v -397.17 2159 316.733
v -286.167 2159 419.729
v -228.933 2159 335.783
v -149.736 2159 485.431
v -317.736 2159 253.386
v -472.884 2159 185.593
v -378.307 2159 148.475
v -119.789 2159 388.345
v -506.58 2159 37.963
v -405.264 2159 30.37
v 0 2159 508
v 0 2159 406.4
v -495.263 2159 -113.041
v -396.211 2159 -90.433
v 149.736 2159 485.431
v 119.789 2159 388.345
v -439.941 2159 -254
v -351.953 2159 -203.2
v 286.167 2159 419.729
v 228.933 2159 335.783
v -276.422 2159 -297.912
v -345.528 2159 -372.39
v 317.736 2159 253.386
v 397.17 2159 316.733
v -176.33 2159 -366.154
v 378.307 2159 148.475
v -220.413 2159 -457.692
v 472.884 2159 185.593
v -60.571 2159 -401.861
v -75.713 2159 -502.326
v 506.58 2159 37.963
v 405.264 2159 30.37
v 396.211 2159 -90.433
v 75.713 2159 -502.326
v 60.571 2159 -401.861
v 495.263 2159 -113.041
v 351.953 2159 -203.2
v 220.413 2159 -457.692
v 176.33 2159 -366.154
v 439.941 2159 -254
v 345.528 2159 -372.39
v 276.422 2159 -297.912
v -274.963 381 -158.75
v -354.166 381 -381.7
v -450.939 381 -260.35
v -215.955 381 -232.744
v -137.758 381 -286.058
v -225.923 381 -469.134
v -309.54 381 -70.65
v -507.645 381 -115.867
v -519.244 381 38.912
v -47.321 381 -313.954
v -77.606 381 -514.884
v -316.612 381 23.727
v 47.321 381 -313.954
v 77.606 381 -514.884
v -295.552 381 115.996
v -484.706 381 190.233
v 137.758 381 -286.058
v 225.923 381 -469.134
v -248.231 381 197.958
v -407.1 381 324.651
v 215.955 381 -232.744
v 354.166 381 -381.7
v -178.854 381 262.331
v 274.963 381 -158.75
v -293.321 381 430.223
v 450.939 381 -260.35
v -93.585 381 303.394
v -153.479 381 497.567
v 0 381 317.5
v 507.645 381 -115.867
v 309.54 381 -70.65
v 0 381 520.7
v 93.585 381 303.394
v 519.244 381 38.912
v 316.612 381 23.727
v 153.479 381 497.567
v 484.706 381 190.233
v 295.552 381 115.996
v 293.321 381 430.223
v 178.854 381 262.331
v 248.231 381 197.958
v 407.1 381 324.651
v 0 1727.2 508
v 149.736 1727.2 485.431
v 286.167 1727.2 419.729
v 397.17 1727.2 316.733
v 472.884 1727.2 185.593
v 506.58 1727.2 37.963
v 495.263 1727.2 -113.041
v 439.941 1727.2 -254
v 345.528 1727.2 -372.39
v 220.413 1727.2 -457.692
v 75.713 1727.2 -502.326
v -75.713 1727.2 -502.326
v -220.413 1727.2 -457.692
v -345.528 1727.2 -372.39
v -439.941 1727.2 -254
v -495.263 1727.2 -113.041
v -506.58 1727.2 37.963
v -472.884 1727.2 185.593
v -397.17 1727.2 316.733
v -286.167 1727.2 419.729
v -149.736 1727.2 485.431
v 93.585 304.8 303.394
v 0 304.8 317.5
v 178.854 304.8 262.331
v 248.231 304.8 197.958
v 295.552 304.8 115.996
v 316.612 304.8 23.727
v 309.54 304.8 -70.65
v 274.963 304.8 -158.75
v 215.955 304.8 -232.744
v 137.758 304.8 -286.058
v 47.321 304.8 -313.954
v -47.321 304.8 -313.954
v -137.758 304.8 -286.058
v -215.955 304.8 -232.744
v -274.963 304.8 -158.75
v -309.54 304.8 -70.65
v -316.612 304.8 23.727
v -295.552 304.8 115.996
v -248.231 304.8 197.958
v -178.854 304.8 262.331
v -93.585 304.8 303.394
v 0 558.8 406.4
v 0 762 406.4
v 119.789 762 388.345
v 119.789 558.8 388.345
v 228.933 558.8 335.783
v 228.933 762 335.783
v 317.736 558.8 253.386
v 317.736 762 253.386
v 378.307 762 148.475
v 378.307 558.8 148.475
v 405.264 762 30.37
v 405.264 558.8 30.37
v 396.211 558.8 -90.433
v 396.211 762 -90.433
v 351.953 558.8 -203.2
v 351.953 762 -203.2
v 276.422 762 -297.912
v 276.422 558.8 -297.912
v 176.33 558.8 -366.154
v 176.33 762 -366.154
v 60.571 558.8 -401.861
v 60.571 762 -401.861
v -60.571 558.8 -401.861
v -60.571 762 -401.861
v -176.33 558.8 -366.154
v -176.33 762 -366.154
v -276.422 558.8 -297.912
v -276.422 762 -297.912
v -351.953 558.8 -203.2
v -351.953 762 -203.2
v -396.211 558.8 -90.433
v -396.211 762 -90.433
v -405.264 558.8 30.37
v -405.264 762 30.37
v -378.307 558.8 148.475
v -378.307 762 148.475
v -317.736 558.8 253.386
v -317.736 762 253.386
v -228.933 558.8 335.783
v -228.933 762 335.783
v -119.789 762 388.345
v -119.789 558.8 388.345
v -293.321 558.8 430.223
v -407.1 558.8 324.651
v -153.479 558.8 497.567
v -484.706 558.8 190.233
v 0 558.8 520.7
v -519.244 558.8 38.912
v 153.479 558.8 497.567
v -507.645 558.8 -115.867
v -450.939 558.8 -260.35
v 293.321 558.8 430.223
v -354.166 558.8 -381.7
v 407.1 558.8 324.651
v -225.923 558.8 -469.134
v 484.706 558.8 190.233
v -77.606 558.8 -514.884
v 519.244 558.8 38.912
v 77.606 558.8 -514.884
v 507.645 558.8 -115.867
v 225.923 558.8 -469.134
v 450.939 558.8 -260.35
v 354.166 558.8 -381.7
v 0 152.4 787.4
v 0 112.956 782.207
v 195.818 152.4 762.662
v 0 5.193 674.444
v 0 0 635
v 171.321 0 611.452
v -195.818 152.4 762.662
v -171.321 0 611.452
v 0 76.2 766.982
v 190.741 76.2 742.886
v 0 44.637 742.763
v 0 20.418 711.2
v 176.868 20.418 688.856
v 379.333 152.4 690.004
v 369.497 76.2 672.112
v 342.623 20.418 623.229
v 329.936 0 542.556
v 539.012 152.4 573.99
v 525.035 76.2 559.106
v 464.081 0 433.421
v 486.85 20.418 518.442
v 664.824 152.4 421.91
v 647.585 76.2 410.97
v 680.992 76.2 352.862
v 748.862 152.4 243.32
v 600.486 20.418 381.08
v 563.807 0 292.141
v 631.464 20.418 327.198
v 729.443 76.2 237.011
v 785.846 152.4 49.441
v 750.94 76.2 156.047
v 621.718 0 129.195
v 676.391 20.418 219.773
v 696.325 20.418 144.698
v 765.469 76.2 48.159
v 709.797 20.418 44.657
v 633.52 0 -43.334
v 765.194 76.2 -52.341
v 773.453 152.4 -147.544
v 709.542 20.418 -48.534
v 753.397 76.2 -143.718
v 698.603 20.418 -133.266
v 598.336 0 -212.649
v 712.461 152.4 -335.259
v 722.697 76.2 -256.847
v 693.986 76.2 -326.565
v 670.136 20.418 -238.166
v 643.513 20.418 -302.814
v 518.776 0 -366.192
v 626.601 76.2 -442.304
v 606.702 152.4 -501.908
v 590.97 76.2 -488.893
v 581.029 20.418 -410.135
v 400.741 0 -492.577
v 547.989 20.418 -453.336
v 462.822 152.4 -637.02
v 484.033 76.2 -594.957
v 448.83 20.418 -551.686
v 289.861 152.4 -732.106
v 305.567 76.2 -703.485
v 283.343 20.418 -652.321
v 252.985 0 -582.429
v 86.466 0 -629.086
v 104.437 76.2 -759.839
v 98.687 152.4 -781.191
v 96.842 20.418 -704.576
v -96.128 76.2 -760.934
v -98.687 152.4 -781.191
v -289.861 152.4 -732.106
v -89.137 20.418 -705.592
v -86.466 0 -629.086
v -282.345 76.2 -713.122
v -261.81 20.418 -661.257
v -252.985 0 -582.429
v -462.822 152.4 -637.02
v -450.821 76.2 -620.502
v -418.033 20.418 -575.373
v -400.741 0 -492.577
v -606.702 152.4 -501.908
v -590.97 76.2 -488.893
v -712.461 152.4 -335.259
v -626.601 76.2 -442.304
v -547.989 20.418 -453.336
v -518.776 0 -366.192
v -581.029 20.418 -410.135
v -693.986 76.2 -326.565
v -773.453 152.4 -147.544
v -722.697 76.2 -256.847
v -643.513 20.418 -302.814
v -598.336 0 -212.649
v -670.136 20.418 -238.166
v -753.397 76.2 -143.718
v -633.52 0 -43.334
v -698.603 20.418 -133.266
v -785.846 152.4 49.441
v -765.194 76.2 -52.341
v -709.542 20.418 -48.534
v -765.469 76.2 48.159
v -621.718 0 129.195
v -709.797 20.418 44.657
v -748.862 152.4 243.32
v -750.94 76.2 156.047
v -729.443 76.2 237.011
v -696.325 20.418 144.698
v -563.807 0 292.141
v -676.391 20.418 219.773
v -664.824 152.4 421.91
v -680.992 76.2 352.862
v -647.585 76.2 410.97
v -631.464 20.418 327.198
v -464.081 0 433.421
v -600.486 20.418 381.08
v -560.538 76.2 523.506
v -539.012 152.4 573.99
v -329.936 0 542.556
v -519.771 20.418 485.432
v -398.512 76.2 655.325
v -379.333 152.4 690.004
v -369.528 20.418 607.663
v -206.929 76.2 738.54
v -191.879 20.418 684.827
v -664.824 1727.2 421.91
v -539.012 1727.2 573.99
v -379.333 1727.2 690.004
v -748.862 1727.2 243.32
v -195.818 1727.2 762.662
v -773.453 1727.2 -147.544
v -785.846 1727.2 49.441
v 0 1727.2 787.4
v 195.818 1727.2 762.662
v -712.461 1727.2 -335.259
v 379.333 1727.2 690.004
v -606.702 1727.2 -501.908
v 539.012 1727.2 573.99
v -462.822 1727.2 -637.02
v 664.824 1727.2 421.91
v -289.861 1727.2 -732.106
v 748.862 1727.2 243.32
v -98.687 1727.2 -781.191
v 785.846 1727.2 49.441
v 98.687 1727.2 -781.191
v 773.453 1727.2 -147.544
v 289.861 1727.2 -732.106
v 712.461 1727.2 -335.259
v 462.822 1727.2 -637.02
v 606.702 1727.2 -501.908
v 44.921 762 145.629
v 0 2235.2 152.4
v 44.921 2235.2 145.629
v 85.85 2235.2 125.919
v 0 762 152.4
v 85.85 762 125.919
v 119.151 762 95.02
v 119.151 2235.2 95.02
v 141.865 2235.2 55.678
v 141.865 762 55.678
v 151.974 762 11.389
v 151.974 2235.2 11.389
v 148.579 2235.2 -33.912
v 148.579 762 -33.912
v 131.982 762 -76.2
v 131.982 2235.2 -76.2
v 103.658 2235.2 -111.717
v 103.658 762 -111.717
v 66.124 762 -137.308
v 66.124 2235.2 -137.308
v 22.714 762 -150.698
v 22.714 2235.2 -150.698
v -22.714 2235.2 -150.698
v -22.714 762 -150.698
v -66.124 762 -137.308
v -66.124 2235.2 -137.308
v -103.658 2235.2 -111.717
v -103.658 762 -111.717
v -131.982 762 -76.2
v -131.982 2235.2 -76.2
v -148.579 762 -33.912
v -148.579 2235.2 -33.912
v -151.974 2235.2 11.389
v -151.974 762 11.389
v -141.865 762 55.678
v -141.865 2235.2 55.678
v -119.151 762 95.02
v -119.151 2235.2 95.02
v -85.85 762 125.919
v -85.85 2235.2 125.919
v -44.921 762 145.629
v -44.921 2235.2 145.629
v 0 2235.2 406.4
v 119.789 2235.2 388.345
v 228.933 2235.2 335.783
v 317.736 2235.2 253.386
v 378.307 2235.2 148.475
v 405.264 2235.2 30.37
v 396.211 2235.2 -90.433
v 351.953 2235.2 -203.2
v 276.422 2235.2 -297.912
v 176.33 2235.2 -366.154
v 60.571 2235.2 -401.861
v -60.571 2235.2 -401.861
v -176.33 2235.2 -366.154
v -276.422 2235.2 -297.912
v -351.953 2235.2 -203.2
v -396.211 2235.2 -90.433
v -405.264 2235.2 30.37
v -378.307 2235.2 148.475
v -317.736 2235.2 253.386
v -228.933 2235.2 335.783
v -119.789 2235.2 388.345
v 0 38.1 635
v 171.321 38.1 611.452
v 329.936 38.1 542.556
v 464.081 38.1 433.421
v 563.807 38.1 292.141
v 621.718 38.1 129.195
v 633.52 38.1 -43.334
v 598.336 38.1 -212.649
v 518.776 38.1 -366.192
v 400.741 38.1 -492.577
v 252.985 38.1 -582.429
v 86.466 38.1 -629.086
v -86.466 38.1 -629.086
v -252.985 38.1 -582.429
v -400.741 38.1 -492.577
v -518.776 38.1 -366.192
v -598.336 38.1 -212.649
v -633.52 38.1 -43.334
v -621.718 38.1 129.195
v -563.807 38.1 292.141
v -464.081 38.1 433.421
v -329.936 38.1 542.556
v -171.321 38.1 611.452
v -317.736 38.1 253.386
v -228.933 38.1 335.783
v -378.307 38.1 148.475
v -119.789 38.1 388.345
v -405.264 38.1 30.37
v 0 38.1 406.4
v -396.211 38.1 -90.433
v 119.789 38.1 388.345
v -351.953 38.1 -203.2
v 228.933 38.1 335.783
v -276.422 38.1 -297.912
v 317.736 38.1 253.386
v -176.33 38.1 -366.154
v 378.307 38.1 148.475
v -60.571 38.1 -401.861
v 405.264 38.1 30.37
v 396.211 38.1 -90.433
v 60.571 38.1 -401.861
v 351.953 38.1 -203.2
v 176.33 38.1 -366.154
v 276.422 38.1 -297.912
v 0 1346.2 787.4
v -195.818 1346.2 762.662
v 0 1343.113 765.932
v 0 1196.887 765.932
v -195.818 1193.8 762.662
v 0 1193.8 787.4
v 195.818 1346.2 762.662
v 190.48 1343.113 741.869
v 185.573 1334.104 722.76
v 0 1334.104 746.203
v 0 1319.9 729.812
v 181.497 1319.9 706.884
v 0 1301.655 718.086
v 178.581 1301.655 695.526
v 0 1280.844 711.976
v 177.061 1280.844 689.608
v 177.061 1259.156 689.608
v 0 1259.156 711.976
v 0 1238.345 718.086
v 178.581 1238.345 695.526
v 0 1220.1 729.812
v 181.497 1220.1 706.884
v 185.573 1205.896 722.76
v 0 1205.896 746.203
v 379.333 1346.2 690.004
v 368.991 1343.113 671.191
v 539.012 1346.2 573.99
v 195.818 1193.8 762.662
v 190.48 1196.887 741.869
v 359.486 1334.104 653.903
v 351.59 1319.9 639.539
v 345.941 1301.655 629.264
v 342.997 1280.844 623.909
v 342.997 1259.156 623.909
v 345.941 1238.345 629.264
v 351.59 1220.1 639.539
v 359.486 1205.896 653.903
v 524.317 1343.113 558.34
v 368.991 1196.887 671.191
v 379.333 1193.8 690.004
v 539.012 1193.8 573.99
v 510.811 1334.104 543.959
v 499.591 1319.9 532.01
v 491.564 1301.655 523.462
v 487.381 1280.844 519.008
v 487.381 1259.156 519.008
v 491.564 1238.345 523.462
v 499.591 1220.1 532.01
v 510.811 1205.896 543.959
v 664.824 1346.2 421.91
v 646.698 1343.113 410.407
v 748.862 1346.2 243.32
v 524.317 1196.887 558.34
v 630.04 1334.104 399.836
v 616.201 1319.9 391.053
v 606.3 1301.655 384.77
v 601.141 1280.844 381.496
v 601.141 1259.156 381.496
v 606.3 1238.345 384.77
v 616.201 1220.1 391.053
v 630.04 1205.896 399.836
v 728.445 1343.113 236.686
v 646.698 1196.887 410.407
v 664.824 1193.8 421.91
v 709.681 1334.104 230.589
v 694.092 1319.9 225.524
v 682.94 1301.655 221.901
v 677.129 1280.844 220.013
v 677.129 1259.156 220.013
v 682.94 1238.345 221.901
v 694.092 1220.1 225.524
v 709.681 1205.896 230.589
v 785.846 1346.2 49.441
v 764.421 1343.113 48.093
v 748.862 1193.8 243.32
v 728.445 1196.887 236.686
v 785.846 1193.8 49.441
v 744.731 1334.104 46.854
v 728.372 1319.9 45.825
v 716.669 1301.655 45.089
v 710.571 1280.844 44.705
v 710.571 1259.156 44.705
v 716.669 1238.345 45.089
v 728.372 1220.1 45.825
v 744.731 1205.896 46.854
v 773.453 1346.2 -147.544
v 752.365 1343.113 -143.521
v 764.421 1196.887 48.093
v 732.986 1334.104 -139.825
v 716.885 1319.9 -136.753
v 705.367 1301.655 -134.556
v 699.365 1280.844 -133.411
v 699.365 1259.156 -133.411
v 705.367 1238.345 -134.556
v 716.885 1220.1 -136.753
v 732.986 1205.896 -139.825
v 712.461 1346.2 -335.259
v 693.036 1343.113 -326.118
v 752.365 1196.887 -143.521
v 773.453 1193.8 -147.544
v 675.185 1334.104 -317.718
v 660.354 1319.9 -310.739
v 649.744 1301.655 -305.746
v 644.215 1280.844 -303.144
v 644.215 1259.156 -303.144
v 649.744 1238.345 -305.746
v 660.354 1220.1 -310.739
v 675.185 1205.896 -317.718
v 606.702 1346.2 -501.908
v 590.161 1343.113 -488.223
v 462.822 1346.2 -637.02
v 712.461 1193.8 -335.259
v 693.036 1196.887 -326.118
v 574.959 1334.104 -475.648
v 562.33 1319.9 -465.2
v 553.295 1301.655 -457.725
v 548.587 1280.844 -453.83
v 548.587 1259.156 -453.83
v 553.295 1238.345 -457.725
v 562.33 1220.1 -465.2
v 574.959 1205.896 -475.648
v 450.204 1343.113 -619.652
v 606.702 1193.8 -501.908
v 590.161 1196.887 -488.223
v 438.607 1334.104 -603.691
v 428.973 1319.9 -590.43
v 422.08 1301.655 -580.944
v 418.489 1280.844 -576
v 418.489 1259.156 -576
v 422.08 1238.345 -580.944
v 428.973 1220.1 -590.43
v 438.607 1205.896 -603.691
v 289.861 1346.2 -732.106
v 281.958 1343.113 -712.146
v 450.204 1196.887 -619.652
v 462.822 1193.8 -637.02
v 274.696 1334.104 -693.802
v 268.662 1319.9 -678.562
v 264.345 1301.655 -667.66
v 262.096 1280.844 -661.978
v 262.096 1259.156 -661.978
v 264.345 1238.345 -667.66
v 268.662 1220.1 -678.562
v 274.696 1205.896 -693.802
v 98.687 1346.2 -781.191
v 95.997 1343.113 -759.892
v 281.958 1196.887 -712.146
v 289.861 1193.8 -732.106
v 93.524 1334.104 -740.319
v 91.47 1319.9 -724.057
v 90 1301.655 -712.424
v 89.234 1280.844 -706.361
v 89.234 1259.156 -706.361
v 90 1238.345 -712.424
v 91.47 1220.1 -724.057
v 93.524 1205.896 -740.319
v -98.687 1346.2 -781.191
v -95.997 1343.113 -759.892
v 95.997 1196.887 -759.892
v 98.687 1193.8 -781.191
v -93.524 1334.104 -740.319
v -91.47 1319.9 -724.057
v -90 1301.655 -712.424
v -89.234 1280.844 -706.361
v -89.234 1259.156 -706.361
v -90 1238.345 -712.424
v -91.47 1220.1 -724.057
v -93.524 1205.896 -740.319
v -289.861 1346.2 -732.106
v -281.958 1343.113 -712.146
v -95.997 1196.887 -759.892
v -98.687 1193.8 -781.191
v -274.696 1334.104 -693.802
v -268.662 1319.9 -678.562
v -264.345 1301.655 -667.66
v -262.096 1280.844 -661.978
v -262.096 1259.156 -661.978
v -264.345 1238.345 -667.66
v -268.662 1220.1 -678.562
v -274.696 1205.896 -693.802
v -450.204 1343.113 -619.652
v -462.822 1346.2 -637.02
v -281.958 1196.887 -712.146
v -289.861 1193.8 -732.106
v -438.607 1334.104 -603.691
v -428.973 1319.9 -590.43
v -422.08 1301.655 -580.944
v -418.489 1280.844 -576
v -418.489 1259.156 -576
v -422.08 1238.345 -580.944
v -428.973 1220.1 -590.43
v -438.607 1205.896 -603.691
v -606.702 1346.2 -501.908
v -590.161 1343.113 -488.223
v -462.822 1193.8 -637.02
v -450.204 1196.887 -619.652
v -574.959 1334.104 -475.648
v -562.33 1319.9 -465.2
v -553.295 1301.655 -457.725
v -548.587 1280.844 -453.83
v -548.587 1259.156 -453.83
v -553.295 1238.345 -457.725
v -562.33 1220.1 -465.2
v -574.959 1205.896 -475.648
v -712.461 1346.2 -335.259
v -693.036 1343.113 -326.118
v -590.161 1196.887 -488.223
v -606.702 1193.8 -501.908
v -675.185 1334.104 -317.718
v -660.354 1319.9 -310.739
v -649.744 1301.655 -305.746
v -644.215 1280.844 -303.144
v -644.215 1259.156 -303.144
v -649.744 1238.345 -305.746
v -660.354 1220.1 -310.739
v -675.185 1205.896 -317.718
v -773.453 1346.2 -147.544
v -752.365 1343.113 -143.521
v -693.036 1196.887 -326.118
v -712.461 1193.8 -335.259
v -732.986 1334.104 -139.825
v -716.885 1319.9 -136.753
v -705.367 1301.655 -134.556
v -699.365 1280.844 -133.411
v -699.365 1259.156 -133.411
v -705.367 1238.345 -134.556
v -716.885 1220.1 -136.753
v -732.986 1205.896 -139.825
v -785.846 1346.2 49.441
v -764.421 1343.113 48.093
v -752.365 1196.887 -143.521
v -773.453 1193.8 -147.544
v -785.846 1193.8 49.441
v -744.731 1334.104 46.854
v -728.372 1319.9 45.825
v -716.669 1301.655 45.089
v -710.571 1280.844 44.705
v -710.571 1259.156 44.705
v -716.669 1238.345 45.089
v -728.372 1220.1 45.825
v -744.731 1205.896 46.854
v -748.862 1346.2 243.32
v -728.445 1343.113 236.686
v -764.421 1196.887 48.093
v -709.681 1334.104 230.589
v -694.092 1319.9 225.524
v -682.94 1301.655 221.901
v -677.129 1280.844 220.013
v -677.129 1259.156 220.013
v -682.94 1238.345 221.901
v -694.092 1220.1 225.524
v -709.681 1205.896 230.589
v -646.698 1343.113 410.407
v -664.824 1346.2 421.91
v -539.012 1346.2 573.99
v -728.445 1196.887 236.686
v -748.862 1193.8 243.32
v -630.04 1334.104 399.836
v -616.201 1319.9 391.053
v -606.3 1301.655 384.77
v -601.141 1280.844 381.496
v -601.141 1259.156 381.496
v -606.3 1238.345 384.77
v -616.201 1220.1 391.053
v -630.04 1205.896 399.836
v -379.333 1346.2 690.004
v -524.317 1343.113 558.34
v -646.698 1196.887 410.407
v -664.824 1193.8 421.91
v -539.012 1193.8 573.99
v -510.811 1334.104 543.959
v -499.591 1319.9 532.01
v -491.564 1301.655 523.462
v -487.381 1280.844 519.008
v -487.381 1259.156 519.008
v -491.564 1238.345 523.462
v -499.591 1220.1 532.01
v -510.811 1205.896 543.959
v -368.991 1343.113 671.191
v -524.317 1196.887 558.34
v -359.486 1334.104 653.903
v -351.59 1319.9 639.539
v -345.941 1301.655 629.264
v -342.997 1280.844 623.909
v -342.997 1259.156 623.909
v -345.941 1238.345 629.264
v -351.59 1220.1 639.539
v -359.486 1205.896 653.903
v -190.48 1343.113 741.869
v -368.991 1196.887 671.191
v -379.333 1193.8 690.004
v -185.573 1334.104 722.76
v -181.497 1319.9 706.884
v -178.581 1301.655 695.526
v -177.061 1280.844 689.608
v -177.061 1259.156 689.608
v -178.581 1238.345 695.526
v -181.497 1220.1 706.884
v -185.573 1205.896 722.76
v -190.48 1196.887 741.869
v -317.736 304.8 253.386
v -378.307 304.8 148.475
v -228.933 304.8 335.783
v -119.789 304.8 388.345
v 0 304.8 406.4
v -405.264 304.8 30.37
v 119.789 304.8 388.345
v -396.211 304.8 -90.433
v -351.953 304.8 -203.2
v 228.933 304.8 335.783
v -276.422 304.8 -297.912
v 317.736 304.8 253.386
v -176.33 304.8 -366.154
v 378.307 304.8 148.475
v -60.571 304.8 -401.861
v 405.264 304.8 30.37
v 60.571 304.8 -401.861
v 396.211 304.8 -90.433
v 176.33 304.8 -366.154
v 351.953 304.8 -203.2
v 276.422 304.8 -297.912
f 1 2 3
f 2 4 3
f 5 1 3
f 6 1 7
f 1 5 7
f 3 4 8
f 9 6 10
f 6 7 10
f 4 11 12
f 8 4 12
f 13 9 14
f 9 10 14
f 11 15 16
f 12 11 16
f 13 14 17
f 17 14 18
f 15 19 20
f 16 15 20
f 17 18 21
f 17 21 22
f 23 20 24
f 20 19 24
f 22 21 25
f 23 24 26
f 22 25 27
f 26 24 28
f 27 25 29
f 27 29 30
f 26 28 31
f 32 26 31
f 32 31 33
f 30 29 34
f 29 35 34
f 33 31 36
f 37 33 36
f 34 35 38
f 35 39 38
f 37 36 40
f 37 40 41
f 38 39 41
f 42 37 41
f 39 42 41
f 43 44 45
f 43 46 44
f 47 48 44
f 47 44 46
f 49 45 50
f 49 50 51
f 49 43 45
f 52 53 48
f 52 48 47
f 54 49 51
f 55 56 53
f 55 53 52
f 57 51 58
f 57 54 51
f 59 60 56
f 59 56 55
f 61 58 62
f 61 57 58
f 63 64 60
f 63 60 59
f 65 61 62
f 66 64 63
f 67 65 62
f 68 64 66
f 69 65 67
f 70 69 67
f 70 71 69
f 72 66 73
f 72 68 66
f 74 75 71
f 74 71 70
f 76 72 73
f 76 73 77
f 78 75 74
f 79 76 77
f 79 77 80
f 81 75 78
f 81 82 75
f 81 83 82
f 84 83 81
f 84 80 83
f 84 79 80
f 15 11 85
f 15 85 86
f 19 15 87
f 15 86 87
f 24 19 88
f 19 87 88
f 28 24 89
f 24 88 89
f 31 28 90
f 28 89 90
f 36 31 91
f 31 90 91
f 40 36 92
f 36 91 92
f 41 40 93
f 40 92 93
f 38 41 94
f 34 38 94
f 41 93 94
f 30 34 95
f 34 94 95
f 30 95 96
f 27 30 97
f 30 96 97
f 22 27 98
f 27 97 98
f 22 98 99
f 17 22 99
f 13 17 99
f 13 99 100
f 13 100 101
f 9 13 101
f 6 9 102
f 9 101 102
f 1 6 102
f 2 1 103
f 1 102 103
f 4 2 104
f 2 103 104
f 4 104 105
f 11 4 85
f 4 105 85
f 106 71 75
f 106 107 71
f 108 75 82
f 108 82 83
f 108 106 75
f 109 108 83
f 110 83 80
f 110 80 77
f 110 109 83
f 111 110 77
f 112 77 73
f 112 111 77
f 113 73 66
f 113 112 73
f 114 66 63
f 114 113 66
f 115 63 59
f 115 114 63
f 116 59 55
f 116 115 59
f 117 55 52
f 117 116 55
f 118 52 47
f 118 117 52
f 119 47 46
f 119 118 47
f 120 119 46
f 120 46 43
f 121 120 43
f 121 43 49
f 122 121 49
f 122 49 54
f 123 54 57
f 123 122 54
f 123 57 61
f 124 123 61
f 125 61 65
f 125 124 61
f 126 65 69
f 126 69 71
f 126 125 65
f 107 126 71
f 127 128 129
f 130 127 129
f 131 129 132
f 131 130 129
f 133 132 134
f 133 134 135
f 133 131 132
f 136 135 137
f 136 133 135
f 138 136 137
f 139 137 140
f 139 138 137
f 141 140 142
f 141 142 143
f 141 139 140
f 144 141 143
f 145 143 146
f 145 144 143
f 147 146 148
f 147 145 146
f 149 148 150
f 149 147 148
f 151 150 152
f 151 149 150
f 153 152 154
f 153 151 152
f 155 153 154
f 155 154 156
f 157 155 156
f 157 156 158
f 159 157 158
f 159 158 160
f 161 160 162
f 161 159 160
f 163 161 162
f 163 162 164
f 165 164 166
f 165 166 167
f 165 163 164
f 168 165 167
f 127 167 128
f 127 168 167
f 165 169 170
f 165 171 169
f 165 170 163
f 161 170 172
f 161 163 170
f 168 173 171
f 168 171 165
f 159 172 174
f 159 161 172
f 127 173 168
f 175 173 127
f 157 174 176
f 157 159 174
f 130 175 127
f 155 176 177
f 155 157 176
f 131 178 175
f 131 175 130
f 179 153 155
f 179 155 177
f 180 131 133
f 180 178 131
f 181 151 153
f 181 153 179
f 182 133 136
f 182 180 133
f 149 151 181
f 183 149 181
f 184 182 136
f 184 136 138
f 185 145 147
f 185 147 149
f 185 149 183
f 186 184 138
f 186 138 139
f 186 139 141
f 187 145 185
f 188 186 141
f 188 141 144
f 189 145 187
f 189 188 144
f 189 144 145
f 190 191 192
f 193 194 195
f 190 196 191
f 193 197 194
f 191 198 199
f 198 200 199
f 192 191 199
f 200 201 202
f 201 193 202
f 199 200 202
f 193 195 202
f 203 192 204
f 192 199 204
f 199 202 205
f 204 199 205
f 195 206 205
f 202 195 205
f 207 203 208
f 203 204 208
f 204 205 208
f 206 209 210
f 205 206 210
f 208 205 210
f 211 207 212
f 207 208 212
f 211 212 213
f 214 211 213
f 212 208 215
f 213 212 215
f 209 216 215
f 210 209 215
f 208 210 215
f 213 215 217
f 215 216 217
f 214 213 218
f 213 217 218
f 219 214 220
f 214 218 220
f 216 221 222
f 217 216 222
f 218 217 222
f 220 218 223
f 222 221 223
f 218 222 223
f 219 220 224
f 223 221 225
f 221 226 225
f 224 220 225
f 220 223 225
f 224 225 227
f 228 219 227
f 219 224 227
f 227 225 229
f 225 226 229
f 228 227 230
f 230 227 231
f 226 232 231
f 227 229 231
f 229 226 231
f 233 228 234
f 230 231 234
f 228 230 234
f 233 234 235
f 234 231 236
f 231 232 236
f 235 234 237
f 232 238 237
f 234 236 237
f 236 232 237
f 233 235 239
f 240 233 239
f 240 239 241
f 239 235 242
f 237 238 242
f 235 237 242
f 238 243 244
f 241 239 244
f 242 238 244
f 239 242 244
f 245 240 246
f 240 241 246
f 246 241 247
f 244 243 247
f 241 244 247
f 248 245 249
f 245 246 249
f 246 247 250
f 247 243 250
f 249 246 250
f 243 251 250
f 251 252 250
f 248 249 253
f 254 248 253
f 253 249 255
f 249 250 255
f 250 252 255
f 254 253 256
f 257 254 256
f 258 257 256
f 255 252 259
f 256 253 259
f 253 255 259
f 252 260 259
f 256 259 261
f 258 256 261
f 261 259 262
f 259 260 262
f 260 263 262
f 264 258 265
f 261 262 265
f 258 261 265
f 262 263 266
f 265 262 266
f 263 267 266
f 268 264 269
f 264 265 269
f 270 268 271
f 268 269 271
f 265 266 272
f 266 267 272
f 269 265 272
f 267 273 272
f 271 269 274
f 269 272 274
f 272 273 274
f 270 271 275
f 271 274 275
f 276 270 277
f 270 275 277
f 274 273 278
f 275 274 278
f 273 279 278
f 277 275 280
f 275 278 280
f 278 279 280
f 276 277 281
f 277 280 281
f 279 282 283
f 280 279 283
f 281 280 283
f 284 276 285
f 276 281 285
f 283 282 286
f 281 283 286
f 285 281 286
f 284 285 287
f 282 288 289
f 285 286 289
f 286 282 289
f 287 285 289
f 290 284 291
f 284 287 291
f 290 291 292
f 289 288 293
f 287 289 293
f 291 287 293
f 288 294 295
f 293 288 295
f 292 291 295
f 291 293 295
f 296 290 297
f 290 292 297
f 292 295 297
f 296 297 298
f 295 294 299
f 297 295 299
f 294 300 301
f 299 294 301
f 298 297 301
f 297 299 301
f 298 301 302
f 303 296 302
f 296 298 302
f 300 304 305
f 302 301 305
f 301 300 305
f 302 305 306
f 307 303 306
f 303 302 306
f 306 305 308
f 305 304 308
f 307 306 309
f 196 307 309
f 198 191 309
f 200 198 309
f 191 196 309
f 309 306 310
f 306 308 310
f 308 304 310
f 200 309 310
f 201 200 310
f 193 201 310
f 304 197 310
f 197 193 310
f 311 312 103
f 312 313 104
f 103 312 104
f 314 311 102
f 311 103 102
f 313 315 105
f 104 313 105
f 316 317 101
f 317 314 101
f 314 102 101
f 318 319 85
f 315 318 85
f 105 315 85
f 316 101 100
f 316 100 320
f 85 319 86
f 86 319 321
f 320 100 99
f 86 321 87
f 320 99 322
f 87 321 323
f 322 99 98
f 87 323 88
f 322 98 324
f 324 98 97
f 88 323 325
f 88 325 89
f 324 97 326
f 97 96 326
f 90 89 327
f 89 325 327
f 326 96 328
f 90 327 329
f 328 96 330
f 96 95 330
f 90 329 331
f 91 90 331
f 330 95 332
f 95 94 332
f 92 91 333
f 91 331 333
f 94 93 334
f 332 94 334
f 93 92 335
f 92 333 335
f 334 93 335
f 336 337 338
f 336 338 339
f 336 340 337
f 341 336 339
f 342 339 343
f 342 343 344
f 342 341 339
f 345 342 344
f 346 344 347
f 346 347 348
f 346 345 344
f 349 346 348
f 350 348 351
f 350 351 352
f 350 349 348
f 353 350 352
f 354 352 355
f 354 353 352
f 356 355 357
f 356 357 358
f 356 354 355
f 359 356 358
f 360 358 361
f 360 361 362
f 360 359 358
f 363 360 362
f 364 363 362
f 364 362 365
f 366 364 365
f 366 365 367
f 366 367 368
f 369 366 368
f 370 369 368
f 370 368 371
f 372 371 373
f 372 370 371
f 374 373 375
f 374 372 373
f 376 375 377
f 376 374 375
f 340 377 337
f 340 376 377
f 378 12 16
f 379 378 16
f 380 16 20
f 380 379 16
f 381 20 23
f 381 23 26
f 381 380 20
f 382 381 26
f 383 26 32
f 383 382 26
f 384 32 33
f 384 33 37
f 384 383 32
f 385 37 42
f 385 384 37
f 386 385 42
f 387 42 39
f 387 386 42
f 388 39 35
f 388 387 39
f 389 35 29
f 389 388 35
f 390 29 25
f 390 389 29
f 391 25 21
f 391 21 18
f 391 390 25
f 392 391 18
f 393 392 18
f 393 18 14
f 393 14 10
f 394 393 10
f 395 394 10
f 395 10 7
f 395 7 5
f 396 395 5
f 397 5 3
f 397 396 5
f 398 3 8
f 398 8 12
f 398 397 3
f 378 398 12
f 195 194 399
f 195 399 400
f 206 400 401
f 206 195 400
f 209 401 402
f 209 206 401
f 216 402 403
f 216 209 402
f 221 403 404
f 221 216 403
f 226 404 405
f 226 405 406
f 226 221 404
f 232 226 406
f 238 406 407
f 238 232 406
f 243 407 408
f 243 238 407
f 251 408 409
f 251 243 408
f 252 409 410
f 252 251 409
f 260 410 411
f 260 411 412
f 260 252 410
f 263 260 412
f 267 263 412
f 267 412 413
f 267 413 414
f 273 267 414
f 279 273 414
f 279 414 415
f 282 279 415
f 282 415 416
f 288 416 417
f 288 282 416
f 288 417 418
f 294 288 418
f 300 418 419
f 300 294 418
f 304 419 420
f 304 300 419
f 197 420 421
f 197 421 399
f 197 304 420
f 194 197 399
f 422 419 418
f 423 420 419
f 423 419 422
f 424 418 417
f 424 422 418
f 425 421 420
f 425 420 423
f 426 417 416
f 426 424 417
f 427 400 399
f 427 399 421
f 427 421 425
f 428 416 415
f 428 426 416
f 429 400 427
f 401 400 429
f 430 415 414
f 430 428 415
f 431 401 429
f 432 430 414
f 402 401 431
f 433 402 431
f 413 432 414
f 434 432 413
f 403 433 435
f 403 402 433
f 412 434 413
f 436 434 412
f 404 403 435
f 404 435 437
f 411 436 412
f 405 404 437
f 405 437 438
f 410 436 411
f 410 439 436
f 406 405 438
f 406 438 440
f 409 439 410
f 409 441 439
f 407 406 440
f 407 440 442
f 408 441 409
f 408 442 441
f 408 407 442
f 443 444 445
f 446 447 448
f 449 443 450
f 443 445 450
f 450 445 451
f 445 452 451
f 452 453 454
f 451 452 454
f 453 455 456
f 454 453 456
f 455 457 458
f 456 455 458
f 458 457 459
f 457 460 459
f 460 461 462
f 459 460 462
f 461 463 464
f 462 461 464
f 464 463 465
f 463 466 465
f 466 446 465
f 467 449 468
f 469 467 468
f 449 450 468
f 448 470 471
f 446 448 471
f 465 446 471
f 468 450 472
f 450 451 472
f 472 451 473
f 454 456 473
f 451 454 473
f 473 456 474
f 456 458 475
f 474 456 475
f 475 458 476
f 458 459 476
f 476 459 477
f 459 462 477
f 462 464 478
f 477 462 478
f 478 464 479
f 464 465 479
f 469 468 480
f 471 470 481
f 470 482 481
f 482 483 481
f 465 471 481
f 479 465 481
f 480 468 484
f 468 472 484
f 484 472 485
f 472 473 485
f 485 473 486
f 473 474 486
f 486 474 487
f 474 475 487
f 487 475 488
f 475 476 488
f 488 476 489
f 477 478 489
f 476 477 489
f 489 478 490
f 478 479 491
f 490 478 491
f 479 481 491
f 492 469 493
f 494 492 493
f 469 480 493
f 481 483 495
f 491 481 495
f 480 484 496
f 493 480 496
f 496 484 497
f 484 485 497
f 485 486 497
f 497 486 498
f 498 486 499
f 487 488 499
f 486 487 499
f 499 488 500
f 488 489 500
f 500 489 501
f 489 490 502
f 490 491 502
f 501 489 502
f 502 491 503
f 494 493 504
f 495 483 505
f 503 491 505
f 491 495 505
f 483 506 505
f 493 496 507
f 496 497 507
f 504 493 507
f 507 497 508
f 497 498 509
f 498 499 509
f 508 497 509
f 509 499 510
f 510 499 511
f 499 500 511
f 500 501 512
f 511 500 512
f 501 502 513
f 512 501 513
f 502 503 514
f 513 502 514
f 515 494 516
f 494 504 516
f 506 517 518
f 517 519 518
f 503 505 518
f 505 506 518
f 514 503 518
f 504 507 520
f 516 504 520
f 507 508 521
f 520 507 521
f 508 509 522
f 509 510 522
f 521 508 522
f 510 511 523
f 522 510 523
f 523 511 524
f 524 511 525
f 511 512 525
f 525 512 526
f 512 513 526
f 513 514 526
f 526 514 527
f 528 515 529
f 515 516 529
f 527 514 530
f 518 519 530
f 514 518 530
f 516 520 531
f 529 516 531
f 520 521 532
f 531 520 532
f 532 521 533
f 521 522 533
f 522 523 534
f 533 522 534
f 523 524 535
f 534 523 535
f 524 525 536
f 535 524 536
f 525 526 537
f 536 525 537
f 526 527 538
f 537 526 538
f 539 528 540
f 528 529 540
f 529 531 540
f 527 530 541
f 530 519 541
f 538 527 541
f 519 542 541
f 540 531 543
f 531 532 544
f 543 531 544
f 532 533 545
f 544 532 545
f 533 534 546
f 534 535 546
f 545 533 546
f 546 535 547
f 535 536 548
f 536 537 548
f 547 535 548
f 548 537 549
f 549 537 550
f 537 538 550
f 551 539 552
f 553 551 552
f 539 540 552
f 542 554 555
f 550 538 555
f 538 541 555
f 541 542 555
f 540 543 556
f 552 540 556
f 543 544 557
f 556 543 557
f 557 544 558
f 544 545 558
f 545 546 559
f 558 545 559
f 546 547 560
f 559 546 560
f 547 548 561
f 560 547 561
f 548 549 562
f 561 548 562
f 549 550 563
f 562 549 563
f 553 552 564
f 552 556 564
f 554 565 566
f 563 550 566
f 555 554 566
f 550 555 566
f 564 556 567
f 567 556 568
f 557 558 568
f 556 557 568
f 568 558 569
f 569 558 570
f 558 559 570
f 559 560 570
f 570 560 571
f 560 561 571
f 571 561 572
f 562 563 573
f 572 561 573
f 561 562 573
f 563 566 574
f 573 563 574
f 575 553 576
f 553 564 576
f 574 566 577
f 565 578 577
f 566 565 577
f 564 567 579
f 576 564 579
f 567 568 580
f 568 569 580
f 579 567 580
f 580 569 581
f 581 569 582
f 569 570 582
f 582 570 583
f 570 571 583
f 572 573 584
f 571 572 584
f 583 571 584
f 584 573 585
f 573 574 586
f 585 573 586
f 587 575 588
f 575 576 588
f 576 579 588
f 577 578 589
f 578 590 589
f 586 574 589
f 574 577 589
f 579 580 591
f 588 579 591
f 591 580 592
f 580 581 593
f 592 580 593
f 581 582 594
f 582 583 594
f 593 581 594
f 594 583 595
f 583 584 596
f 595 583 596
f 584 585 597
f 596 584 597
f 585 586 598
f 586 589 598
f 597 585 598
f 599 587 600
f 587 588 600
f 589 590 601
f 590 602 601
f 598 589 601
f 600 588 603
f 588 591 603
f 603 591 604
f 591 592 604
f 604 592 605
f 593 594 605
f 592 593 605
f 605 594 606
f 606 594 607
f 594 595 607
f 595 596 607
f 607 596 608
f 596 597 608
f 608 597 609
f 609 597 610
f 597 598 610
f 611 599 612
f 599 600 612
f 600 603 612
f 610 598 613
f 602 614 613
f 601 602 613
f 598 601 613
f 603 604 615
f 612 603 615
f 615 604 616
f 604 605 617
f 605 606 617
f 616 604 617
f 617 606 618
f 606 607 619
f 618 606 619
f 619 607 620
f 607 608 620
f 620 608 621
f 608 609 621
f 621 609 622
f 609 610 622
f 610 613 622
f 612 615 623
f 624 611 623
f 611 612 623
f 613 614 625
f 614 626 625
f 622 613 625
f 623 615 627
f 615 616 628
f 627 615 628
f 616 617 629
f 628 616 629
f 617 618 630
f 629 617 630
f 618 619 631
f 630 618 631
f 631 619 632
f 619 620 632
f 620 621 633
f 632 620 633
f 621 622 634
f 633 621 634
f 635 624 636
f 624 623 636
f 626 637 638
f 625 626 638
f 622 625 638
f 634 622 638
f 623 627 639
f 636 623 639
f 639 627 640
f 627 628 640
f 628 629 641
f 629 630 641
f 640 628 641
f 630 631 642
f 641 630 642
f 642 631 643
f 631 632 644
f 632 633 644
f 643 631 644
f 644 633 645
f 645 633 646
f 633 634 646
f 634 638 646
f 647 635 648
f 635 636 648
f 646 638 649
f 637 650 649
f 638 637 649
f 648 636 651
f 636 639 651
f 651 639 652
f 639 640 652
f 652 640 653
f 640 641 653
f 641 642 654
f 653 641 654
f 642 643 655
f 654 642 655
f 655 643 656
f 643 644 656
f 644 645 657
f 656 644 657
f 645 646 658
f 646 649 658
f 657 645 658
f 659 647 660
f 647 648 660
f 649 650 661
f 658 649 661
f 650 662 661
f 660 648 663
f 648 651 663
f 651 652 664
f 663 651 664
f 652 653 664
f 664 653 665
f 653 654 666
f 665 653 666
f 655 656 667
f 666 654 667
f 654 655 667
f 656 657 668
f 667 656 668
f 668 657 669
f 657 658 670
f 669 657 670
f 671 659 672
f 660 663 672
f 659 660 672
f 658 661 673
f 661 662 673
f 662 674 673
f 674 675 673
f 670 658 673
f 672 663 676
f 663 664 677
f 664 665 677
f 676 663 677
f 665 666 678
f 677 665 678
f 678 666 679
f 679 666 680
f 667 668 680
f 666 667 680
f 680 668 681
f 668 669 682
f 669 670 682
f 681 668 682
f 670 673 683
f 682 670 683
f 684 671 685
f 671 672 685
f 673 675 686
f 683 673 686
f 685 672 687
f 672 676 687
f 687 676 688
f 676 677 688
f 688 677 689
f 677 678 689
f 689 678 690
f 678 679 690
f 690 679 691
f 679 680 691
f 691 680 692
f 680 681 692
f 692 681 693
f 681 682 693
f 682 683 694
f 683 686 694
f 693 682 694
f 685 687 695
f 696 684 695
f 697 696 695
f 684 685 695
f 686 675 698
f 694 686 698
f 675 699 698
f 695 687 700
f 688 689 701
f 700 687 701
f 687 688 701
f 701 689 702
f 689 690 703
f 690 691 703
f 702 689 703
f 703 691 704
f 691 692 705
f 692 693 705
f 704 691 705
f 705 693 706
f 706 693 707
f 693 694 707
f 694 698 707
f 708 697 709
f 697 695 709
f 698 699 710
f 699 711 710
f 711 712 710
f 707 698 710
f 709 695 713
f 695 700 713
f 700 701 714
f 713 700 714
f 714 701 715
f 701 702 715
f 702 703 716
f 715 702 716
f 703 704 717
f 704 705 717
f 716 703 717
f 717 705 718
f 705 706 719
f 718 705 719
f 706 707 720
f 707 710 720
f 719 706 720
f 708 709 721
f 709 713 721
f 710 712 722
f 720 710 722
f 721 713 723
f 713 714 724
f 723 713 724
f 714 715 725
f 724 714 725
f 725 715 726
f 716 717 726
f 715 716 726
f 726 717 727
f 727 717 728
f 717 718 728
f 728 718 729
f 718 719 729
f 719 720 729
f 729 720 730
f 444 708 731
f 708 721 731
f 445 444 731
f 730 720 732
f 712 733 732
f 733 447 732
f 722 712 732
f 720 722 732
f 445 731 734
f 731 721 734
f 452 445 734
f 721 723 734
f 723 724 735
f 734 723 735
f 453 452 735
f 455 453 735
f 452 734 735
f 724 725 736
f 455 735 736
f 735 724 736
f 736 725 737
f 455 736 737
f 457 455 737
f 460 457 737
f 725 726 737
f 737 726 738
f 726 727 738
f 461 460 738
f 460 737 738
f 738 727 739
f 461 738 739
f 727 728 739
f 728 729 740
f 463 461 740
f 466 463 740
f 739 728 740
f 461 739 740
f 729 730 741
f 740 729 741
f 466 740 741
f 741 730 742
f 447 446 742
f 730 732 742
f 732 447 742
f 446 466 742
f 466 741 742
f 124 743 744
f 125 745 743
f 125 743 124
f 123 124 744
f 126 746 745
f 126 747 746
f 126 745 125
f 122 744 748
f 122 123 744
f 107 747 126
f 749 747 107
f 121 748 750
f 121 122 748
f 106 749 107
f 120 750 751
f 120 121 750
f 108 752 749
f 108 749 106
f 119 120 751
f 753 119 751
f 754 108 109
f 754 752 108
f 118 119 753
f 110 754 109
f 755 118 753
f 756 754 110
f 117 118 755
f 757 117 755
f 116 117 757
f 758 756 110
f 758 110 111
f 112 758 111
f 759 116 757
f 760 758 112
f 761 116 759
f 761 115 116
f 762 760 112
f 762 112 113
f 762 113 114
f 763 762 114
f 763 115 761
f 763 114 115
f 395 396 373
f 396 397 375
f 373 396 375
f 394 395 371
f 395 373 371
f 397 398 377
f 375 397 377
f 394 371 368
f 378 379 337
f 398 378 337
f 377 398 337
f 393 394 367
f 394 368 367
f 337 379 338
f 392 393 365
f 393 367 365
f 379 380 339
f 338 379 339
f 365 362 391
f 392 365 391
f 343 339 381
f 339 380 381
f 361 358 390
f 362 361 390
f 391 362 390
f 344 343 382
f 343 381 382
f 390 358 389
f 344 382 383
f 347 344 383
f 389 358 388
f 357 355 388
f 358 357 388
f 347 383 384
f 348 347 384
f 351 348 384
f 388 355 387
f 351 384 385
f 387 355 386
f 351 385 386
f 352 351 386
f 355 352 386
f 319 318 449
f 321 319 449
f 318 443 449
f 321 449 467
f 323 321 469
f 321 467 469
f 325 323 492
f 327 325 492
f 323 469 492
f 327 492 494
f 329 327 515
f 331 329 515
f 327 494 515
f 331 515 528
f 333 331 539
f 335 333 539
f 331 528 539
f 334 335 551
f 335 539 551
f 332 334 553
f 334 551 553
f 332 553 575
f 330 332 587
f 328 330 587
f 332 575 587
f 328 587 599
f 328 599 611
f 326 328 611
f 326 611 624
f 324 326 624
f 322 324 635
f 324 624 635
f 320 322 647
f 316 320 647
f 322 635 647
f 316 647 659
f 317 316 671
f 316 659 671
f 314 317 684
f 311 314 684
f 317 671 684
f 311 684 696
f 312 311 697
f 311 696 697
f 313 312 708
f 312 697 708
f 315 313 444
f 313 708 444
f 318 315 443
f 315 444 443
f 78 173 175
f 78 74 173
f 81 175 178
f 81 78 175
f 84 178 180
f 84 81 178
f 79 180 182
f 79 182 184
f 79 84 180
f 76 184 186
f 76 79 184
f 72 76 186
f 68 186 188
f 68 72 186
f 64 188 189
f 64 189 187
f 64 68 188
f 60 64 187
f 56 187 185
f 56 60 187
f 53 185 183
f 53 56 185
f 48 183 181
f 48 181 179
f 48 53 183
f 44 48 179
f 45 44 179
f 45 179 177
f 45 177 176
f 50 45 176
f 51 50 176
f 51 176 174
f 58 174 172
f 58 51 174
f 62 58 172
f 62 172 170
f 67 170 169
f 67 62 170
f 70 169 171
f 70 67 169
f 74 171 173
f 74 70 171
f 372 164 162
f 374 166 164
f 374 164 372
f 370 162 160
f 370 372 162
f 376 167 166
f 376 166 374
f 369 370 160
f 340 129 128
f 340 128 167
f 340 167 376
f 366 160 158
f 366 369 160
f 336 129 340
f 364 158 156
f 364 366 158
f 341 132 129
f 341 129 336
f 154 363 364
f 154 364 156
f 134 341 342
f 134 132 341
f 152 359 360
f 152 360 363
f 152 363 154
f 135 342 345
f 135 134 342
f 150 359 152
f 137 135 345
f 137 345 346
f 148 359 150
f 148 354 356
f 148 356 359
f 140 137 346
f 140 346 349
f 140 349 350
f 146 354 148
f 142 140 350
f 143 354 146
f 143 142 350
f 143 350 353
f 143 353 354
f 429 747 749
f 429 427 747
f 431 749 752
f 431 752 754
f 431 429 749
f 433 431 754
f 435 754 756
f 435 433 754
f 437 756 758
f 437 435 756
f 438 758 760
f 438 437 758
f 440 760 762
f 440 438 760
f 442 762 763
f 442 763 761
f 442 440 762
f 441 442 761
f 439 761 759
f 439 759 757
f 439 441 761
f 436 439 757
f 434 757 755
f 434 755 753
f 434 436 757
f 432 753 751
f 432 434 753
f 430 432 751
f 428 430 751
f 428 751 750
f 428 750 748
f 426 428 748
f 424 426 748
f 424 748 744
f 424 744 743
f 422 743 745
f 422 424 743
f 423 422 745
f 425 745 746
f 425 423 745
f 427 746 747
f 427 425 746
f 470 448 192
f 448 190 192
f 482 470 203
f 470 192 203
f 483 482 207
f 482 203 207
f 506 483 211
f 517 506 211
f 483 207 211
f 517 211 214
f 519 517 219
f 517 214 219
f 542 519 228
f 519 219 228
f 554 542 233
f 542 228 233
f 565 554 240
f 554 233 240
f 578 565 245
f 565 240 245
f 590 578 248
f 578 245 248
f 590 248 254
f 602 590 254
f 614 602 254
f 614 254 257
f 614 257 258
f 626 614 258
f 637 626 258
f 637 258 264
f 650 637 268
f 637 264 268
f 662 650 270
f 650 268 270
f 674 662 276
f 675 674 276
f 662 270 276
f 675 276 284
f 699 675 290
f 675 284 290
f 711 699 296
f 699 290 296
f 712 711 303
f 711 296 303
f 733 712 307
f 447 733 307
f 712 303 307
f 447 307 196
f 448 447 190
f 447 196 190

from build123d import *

# Parameters (mm, degrees)
F0_W = 76.2
F0_H = 406.4


with BuildPart() as f1:
    # F0 (on Right) → F1 (revolve)
    with BuildSketch(Plane.YZ):
        with Locations((2197.1, 203.2)):
            Rectangle(F0_W, F0_H)
        Polygon((1727.2, 508), (1727.2, 0), (2159, 0), (2159, 406.4), (2159, 508), align=None)
        with BuildLine():
            Line((0, 635), (0, 0))
            Line((0, 0), (1727.2, 0))
            Line((1727.2, 0), (1727.2, 508))
            Line((1727.2, 508), (1727.2, 787.4))
            Line((1727.2, 787.4), (1346.2, 787.4))
            ThreePointArc((1346.2, 787.4), (1270, 711.2), (1193.8, 787.4))
            Line((1193.8, 787.4), (152.4, 787.4))
            ThreePointArc((152.4, 787.4), (44.636927, 742.763073), (0, 635))
        make_face()
    revolve(axis=Axis((0, 1117.6, 0), (0, 1, 0)))

    # F2 (on Right) → F3 (revolve, cut)
    with BuildSketch(Plane.YZ):
        Polygon((0, 635), (0, 0), (2235.2, 0), (2235.2, 152.4), (762, 152.4), (762, 406.4), (558.8, 406.4), (558.8, 520.7), (381, 520.7), (381, 317.5), (304.8, 317.5), (304.8, 406.4), (38.1, 406.4), (38.1, 635), align=None)
    revolve(axis=Axis((0, 1117.6, 0), (0, 1, 0)), mode=Mode.SUBTRACT)


solid = f1.part
